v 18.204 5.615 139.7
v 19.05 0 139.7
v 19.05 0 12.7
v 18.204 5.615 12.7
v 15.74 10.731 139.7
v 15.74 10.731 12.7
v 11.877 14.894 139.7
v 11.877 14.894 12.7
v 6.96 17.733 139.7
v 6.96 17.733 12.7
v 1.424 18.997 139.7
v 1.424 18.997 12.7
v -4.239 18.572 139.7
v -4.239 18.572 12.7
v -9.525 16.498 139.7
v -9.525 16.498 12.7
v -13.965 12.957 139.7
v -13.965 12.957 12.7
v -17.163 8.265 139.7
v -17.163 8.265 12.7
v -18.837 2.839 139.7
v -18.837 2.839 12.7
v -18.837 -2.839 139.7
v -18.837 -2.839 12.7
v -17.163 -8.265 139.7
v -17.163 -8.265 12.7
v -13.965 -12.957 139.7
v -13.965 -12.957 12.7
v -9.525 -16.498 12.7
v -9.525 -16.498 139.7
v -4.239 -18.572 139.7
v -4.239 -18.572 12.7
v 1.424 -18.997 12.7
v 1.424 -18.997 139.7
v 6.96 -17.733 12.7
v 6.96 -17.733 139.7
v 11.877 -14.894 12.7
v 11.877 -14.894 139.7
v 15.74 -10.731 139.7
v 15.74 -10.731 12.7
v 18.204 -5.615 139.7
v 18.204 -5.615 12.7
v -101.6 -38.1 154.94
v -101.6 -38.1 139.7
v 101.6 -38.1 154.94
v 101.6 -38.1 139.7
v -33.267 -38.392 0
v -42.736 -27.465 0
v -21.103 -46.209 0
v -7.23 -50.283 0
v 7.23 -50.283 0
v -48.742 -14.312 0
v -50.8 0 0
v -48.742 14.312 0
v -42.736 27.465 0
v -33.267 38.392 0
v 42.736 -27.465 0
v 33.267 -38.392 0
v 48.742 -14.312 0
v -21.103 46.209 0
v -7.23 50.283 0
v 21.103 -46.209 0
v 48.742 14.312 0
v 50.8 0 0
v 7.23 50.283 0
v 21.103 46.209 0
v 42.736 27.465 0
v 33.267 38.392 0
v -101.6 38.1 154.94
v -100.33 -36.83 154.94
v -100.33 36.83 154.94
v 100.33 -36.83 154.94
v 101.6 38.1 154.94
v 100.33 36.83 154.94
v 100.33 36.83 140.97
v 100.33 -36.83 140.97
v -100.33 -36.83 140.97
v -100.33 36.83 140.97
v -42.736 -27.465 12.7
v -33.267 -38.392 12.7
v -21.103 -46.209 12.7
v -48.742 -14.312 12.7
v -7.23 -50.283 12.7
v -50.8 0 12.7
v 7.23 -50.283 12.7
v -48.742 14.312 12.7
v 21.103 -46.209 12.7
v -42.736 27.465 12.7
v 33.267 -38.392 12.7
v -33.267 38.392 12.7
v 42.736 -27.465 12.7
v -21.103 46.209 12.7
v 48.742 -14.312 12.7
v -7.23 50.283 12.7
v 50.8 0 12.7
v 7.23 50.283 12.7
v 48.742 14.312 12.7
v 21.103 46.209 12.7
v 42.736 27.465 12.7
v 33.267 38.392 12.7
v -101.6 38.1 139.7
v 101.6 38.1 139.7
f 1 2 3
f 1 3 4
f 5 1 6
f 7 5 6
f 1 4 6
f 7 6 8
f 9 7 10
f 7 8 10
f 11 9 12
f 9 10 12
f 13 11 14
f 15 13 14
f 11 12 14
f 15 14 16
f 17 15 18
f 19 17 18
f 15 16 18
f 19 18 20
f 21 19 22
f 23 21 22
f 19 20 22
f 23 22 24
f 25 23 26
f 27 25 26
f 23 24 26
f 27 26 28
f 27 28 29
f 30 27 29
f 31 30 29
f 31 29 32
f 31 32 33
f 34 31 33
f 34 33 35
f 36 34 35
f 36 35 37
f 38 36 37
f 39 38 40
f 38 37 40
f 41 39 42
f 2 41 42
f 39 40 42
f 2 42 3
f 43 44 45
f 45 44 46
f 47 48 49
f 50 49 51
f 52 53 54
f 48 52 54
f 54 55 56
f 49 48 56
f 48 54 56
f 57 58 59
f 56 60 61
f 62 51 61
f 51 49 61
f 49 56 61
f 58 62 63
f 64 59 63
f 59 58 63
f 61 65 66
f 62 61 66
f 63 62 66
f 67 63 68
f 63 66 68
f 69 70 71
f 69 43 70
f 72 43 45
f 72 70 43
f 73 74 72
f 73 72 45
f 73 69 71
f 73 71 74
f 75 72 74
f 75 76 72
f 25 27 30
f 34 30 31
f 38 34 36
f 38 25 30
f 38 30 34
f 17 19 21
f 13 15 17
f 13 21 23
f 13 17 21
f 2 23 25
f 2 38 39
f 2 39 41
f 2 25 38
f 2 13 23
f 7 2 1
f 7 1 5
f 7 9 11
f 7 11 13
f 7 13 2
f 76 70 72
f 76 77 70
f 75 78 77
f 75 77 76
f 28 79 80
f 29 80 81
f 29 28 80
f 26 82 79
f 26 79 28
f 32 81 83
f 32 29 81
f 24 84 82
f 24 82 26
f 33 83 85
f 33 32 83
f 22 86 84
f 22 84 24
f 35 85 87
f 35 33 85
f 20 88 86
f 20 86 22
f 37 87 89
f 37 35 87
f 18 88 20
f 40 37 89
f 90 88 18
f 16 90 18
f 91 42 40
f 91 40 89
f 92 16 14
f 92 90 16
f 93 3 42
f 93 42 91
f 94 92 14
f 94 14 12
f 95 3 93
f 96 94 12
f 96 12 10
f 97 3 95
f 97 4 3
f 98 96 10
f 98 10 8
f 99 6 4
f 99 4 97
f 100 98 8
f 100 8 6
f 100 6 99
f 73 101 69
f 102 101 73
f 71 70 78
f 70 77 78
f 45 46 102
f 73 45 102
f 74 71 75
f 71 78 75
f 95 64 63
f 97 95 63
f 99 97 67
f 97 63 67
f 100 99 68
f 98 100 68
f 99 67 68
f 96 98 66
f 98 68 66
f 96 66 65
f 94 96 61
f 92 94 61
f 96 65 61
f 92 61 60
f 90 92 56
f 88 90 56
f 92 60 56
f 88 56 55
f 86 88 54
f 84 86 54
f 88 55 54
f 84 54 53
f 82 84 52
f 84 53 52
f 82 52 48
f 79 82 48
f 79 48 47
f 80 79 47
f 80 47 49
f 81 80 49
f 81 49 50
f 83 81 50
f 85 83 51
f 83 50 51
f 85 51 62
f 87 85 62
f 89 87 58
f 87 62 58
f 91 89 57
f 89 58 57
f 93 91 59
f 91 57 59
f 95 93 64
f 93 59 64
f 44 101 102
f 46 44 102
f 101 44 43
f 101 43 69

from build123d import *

# Parameters (mm, degrees)
F0_R     = 50.8
F1_DEPTH = 12.7
F2_R     = 19.05
F3_DEPTH = 127
F4_W     = 203.2
F4_H     = 76.2
F4_R     = 19.05
F5_DEPTH = 15.24
F6_T     = -1.27


with BuildPart() as f1:
    # F0 (on Top) → F1 (new body)
    with BuildSketch(Plane.XY):
        Circle(F0_R)
    extrude(amount=F1_DEPTH)

    # F2 (on face) → F3 (join)
    with BuildSketch(Plane.XY.offset(12.7)):
        Circle(F2_R)
    extrude(amount=F3_DEPTH)


with BuildPart() as f5:
    # F4 (on face) → F5 (new body)
    with BuildSketch(Plane.XY.offset(139.7)):
        Rectangle(F4_W, F4_H)
        Circle(F4_R, mode=Mode.SUBTRACT)
        Circle(F4_R)
    extrude(amount=F5_DEPTH)

    # F6
    f6_openings = [f5.faces().sort_by_distance(p)[0] for p in [
        (0, 0, 154.94),
    ]]
    offset(amount=F6_T, openings=f6_openings)


solid = Compound([f1.part, f5.part])
